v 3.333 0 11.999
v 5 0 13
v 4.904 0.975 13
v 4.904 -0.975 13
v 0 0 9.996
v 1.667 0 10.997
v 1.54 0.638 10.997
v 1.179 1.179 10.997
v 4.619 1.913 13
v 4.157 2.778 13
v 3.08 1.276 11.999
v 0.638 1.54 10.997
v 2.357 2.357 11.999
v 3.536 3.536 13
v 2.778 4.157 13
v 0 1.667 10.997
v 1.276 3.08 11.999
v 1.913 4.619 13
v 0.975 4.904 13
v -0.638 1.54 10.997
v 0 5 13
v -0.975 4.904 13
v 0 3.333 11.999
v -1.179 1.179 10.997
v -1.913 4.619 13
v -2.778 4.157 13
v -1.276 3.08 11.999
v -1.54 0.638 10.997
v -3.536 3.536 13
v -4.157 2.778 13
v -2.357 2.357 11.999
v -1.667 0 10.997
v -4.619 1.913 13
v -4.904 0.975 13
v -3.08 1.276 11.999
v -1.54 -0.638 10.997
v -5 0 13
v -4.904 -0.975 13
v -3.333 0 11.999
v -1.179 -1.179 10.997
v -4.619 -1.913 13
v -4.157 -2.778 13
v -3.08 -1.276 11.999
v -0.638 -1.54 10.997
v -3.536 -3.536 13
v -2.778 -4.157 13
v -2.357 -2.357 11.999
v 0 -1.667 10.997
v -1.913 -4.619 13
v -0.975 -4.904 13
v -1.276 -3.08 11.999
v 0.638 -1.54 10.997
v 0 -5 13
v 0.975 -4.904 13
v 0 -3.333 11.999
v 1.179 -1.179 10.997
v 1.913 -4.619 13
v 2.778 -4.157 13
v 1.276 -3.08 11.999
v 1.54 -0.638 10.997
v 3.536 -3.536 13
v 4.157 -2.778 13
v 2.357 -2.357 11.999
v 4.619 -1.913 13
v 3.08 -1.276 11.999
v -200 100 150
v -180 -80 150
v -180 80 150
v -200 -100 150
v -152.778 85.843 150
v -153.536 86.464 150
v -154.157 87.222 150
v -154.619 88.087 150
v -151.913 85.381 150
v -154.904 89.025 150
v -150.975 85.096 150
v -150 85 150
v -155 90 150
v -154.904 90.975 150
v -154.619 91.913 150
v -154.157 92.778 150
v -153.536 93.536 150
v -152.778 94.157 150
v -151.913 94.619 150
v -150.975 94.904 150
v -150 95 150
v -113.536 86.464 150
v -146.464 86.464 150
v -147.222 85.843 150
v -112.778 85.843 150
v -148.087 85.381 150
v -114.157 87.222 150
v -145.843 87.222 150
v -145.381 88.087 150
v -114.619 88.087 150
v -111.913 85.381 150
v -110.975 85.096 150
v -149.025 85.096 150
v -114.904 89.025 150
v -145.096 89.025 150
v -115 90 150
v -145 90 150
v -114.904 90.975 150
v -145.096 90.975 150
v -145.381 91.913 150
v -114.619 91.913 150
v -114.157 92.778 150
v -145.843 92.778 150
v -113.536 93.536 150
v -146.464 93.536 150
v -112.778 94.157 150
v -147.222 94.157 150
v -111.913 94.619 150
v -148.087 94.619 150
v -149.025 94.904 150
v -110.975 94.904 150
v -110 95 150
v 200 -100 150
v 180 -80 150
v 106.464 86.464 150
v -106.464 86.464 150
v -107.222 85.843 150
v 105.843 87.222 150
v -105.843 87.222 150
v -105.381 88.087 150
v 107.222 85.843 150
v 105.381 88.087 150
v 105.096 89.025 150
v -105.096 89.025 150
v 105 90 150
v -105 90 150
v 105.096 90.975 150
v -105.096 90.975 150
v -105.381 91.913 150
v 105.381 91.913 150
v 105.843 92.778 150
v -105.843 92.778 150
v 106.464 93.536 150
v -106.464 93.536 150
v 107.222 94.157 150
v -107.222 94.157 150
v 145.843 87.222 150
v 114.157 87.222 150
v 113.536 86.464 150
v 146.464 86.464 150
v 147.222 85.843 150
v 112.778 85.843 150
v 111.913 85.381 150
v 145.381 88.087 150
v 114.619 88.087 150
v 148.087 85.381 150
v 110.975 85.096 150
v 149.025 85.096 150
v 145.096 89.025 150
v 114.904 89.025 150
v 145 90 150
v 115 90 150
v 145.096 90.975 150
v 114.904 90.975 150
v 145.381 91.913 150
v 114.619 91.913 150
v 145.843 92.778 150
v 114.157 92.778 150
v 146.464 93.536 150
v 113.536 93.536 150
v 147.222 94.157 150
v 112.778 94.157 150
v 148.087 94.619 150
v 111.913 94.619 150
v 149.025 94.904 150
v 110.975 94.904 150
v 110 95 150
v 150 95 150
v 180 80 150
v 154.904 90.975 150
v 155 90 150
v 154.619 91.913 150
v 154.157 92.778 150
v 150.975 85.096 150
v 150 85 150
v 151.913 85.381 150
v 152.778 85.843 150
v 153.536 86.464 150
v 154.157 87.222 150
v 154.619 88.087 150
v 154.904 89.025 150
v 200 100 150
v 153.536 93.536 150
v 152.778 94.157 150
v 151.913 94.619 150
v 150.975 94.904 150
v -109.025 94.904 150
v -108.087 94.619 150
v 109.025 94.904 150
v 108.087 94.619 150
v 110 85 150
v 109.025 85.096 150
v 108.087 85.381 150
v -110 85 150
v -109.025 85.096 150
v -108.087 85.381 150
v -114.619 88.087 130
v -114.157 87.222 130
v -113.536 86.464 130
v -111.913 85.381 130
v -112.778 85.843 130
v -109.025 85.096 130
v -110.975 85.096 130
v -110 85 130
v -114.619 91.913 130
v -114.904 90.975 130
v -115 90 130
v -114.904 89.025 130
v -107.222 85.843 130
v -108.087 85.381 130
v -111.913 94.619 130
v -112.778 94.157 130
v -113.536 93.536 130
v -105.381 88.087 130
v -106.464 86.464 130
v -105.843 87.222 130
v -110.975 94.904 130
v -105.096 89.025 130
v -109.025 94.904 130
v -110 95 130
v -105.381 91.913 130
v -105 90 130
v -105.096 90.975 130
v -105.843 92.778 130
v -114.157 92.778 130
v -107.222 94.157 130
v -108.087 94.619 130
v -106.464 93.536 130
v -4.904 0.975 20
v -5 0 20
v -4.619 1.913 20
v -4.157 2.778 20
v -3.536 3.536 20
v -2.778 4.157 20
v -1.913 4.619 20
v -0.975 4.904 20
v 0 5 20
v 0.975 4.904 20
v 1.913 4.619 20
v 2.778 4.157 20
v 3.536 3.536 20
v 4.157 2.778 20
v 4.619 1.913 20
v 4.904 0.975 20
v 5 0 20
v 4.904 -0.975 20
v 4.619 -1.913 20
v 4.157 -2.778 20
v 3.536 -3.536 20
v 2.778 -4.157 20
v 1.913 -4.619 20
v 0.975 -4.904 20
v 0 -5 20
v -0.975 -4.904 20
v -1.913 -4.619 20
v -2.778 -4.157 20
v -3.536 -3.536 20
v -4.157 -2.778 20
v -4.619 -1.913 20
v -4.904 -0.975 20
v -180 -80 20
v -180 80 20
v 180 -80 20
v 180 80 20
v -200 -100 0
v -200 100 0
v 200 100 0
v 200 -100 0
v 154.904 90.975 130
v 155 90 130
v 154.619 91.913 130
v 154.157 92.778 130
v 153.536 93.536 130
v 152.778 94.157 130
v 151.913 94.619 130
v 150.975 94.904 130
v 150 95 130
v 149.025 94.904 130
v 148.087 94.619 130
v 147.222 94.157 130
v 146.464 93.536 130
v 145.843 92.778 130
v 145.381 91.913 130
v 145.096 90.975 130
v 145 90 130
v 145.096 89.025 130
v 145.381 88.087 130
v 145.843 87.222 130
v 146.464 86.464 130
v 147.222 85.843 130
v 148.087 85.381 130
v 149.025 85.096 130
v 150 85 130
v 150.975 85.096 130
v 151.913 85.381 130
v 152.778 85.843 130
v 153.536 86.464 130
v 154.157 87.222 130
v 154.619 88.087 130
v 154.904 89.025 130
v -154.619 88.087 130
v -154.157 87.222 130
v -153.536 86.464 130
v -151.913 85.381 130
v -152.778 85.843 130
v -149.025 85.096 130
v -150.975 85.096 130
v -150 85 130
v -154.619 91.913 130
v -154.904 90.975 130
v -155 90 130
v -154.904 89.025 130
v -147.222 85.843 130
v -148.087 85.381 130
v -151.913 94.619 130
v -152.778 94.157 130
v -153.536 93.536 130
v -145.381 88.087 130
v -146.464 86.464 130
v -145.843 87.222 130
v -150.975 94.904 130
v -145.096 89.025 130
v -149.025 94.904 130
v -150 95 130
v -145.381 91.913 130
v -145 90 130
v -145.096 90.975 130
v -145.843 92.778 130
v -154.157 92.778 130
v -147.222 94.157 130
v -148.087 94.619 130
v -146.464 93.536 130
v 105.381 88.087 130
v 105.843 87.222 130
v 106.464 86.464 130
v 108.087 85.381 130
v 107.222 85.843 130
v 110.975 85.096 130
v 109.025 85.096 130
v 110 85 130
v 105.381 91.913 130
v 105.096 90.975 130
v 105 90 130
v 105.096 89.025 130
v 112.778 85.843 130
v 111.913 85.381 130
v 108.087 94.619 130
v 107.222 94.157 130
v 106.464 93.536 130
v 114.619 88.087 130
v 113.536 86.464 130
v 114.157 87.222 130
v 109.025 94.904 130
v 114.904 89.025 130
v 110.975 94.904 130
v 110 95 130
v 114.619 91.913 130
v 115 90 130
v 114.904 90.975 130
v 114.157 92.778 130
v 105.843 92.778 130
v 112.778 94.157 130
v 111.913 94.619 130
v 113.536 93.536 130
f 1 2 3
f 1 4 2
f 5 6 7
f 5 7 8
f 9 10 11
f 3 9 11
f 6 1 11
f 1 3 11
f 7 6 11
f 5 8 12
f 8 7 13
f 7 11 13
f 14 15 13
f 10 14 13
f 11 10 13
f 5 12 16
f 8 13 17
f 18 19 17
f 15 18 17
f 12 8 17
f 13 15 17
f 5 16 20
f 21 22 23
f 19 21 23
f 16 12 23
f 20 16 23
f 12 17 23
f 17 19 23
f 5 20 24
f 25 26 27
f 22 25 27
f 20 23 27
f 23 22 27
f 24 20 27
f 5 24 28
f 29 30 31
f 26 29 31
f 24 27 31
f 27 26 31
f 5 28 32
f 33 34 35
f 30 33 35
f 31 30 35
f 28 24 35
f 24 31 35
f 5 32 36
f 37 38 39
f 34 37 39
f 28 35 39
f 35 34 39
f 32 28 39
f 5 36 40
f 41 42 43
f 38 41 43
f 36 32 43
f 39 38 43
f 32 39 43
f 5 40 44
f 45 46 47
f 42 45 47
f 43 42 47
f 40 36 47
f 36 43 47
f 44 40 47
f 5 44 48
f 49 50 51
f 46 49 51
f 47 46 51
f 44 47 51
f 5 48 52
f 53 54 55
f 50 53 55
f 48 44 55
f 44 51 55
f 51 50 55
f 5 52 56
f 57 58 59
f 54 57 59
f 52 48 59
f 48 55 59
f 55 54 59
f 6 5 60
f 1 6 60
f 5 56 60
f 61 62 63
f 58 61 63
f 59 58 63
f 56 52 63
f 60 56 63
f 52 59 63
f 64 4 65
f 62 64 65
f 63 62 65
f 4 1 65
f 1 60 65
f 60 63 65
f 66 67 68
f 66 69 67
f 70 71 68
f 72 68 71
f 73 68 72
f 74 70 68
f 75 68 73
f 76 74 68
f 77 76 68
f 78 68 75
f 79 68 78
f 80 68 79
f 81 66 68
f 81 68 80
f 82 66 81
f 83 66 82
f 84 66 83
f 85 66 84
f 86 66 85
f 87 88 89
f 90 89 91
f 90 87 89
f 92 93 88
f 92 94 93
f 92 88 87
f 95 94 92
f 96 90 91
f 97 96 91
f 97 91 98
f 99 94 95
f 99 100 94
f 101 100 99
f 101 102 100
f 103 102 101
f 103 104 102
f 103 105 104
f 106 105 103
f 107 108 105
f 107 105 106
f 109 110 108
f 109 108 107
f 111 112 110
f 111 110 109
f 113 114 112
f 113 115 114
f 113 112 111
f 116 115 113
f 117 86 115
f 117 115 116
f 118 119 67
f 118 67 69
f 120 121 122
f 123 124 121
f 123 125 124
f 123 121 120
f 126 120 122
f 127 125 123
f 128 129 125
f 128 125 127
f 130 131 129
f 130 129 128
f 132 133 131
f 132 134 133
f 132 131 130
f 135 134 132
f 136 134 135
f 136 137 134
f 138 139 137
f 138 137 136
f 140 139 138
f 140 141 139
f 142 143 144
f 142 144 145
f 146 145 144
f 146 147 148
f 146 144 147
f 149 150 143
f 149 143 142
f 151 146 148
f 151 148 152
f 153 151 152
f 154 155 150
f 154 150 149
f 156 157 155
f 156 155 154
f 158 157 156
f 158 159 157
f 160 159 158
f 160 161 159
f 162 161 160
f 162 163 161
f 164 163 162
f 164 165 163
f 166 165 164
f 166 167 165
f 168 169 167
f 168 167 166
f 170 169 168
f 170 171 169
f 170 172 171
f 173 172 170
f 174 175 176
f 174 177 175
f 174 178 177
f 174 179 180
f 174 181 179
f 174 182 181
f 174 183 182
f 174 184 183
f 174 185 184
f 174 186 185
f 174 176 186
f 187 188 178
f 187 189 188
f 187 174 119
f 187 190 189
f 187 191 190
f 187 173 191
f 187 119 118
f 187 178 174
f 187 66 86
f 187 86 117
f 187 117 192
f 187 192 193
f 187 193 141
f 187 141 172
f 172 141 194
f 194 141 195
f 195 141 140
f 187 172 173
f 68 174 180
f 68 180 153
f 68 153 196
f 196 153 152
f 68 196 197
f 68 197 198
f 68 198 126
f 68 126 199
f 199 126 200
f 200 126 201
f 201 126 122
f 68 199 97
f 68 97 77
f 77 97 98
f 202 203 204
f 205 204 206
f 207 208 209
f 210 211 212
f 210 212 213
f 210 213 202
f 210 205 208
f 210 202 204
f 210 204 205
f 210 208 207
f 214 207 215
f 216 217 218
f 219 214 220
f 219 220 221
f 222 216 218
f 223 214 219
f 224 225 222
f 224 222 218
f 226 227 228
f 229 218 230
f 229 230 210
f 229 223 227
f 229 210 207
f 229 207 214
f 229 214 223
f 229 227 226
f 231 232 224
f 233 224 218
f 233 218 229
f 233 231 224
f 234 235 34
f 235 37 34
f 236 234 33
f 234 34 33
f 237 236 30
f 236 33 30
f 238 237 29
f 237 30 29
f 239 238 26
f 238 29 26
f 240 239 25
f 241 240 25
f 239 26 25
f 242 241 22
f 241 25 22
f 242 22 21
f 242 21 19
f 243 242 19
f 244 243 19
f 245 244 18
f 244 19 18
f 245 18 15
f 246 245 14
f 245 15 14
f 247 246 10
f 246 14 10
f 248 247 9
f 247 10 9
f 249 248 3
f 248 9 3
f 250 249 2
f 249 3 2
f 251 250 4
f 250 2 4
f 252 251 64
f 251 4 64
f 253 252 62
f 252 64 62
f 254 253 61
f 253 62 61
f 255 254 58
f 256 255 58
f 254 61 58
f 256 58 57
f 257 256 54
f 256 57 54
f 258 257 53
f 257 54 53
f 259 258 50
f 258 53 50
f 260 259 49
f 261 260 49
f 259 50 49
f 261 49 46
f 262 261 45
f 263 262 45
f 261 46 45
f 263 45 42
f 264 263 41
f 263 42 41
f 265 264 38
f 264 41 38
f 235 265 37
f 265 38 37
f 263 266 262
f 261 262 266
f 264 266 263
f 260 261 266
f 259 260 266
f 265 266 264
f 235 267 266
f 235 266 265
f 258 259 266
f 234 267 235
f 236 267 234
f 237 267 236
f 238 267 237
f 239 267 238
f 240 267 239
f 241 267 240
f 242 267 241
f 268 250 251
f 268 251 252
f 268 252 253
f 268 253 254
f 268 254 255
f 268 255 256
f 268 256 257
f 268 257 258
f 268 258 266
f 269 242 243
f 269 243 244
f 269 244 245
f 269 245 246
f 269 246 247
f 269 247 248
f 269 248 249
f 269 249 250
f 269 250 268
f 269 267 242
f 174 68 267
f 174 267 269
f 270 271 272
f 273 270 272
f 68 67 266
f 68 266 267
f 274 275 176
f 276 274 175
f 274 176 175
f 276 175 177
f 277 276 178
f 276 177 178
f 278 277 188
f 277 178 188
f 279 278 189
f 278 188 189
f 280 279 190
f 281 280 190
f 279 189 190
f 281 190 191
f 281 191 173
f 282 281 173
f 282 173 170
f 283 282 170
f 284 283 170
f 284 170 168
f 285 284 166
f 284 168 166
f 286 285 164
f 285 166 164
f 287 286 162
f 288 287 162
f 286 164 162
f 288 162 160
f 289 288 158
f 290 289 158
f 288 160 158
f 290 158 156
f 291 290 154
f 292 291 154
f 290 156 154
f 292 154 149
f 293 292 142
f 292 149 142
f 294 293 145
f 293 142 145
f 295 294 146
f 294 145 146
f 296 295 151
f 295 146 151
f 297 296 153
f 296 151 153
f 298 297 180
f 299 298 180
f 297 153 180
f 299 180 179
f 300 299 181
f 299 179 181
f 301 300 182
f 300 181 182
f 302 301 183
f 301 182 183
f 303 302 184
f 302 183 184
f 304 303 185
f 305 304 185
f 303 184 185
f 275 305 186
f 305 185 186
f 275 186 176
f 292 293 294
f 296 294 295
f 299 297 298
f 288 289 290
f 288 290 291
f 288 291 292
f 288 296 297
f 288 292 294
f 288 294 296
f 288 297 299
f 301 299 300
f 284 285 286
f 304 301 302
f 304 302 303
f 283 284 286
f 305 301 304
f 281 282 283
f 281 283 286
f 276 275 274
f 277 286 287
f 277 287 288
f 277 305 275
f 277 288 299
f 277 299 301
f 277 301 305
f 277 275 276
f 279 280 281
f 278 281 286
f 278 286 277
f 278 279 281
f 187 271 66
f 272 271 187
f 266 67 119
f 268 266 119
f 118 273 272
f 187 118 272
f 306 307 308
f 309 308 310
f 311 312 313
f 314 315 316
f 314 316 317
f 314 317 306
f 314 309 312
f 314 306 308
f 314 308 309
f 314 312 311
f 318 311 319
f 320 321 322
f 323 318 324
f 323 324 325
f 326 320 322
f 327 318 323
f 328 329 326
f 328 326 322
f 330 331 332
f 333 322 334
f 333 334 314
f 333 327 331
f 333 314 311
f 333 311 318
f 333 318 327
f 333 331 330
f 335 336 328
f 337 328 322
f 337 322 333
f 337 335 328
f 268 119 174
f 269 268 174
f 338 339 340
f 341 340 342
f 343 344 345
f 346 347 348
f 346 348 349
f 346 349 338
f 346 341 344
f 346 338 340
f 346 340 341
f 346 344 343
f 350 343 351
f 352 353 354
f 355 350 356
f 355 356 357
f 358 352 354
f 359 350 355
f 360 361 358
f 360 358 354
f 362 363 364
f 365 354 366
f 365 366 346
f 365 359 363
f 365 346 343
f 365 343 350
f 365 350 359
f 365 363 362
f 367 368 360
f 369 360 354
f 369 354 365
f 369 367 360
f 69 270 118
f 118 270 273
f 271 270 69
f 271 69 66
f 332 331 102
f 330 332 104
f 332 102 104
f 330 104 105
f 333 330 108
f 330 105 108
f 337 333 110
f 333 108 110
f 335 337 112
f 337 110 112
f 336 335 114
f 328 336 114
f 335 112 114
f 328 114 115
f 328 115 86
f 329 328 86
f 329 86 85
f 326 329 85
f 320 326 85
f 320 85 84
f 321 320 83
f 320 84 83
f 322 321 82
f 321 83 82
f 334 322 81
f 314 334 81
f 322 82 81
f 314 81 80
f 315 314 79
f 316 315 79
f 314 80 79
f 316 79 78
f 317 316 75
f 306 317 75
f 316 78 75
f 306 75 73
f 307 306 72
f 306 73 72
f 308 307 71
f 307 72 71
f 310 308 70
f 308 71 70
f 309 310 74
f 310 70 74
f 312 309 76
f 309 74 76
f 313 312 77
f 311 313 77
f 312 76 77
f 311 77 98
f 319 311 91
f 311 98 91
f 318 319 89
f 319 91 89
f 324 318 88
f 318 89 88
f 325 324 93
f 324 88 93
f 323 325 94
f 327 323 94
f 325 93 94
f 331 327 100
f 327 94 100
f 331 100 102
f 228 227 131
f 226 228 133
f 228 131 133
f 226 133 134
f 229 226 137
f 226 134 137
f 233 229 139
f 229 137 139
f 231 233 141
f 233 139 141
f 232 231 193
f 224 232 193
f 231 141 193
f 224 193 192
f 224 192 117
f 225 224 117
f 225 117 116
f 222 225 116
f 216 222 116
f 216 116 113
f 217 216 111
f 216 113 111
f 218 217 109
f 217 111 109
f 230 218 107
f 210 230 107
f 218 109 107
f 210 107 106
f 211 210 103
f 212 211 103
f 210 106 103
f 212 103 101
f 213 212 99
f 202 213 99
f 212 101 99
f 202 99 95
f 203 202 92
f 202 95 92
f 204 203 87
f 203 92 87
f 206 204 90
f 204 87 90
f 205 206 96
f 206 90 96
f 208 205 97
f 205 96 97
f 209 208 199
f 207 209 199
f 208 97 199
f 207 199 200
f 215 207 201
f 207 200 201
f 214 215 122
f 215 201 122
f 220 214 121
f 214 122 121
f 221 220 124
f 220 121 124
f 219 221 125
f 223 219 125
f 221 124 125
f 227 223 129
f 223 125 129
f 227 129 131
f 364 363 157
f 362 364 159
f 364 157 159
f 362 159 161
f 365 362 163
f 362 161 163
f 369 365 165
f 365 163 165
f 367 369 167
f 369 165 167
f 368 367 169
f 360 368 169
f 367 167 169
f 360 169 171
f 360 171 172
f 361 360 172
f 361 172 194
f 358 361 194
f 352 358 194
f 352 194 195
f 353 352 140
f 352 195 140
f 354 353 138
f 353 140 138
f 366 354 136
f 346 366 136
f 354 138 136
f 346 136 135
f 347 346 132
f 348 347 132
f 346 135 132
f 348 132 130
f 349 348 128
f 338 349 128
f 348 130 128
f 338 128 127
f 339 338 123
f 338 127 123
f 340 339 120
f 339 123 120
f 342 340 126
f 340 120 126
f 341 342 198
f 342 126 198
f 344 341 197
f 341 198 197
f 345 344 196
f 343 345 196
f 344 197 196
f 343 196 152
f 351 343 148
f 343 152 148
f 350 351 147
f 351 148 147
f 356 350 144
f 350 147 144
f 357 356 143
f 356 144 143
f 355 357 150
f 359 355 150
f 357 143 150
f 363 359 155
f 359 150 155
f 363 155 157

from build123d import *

# Parameters (mm, degrees)
F0_W     = 400
F0_H     = 200
F1_DEPTH = 150
F2_W     = 360
F2_H     = 160
F3_DEPTH = 130
F4_R     = 5
F5_DEPTH = 20
F7_D     = 10
F7_DEPTH = 7
F7_TIP   = 3.0043030951


with BuildPart() as f1:
    # F0 (on Top) → F1 (new body)
    with BuildSketch(Plane.XY):
        Rectangle(F0_W, F0_H)
    extrude(amount=F1_DEPTH)

    # F2 (on face) → F3 (cut)
    with BuildSketch(Plane.XY.offset(150)):
        Rectangle(F2_W, F2_H)
    extrude(amount=-F3_DEPTH, mode=Mode.SUBTRACT)

    # F4 (on face) → F5 (cut)
    with BuildSketch(Plane.XY.offset(150)):
        with Locations((-150, 90)):
            Circle(F4_R)
        with Locations((-110, 90)):
            Circle(F4_R)
        with Locations((110, 90)):
            Circle(F4_R)
        with Locations((150, 90)):
            Circle(F4_R)
    extrude(amount=-F5_DEPTH, mode=Mode.SUBTRACT)

    # F7
    with Locations(Plane.XY.offset(20)):
        with Locations((0, 0)):
            Hole(F7_D / 2, depth=F7_DEPTH)
            with Locations((0, 0, -(F7_DEPTH + F7_TIP / 2))):  # 118° drill point
                Cone(0, F7_D / 2, F7_TIP, mode=Mode.SUBTRACT)


solid = f1.part
